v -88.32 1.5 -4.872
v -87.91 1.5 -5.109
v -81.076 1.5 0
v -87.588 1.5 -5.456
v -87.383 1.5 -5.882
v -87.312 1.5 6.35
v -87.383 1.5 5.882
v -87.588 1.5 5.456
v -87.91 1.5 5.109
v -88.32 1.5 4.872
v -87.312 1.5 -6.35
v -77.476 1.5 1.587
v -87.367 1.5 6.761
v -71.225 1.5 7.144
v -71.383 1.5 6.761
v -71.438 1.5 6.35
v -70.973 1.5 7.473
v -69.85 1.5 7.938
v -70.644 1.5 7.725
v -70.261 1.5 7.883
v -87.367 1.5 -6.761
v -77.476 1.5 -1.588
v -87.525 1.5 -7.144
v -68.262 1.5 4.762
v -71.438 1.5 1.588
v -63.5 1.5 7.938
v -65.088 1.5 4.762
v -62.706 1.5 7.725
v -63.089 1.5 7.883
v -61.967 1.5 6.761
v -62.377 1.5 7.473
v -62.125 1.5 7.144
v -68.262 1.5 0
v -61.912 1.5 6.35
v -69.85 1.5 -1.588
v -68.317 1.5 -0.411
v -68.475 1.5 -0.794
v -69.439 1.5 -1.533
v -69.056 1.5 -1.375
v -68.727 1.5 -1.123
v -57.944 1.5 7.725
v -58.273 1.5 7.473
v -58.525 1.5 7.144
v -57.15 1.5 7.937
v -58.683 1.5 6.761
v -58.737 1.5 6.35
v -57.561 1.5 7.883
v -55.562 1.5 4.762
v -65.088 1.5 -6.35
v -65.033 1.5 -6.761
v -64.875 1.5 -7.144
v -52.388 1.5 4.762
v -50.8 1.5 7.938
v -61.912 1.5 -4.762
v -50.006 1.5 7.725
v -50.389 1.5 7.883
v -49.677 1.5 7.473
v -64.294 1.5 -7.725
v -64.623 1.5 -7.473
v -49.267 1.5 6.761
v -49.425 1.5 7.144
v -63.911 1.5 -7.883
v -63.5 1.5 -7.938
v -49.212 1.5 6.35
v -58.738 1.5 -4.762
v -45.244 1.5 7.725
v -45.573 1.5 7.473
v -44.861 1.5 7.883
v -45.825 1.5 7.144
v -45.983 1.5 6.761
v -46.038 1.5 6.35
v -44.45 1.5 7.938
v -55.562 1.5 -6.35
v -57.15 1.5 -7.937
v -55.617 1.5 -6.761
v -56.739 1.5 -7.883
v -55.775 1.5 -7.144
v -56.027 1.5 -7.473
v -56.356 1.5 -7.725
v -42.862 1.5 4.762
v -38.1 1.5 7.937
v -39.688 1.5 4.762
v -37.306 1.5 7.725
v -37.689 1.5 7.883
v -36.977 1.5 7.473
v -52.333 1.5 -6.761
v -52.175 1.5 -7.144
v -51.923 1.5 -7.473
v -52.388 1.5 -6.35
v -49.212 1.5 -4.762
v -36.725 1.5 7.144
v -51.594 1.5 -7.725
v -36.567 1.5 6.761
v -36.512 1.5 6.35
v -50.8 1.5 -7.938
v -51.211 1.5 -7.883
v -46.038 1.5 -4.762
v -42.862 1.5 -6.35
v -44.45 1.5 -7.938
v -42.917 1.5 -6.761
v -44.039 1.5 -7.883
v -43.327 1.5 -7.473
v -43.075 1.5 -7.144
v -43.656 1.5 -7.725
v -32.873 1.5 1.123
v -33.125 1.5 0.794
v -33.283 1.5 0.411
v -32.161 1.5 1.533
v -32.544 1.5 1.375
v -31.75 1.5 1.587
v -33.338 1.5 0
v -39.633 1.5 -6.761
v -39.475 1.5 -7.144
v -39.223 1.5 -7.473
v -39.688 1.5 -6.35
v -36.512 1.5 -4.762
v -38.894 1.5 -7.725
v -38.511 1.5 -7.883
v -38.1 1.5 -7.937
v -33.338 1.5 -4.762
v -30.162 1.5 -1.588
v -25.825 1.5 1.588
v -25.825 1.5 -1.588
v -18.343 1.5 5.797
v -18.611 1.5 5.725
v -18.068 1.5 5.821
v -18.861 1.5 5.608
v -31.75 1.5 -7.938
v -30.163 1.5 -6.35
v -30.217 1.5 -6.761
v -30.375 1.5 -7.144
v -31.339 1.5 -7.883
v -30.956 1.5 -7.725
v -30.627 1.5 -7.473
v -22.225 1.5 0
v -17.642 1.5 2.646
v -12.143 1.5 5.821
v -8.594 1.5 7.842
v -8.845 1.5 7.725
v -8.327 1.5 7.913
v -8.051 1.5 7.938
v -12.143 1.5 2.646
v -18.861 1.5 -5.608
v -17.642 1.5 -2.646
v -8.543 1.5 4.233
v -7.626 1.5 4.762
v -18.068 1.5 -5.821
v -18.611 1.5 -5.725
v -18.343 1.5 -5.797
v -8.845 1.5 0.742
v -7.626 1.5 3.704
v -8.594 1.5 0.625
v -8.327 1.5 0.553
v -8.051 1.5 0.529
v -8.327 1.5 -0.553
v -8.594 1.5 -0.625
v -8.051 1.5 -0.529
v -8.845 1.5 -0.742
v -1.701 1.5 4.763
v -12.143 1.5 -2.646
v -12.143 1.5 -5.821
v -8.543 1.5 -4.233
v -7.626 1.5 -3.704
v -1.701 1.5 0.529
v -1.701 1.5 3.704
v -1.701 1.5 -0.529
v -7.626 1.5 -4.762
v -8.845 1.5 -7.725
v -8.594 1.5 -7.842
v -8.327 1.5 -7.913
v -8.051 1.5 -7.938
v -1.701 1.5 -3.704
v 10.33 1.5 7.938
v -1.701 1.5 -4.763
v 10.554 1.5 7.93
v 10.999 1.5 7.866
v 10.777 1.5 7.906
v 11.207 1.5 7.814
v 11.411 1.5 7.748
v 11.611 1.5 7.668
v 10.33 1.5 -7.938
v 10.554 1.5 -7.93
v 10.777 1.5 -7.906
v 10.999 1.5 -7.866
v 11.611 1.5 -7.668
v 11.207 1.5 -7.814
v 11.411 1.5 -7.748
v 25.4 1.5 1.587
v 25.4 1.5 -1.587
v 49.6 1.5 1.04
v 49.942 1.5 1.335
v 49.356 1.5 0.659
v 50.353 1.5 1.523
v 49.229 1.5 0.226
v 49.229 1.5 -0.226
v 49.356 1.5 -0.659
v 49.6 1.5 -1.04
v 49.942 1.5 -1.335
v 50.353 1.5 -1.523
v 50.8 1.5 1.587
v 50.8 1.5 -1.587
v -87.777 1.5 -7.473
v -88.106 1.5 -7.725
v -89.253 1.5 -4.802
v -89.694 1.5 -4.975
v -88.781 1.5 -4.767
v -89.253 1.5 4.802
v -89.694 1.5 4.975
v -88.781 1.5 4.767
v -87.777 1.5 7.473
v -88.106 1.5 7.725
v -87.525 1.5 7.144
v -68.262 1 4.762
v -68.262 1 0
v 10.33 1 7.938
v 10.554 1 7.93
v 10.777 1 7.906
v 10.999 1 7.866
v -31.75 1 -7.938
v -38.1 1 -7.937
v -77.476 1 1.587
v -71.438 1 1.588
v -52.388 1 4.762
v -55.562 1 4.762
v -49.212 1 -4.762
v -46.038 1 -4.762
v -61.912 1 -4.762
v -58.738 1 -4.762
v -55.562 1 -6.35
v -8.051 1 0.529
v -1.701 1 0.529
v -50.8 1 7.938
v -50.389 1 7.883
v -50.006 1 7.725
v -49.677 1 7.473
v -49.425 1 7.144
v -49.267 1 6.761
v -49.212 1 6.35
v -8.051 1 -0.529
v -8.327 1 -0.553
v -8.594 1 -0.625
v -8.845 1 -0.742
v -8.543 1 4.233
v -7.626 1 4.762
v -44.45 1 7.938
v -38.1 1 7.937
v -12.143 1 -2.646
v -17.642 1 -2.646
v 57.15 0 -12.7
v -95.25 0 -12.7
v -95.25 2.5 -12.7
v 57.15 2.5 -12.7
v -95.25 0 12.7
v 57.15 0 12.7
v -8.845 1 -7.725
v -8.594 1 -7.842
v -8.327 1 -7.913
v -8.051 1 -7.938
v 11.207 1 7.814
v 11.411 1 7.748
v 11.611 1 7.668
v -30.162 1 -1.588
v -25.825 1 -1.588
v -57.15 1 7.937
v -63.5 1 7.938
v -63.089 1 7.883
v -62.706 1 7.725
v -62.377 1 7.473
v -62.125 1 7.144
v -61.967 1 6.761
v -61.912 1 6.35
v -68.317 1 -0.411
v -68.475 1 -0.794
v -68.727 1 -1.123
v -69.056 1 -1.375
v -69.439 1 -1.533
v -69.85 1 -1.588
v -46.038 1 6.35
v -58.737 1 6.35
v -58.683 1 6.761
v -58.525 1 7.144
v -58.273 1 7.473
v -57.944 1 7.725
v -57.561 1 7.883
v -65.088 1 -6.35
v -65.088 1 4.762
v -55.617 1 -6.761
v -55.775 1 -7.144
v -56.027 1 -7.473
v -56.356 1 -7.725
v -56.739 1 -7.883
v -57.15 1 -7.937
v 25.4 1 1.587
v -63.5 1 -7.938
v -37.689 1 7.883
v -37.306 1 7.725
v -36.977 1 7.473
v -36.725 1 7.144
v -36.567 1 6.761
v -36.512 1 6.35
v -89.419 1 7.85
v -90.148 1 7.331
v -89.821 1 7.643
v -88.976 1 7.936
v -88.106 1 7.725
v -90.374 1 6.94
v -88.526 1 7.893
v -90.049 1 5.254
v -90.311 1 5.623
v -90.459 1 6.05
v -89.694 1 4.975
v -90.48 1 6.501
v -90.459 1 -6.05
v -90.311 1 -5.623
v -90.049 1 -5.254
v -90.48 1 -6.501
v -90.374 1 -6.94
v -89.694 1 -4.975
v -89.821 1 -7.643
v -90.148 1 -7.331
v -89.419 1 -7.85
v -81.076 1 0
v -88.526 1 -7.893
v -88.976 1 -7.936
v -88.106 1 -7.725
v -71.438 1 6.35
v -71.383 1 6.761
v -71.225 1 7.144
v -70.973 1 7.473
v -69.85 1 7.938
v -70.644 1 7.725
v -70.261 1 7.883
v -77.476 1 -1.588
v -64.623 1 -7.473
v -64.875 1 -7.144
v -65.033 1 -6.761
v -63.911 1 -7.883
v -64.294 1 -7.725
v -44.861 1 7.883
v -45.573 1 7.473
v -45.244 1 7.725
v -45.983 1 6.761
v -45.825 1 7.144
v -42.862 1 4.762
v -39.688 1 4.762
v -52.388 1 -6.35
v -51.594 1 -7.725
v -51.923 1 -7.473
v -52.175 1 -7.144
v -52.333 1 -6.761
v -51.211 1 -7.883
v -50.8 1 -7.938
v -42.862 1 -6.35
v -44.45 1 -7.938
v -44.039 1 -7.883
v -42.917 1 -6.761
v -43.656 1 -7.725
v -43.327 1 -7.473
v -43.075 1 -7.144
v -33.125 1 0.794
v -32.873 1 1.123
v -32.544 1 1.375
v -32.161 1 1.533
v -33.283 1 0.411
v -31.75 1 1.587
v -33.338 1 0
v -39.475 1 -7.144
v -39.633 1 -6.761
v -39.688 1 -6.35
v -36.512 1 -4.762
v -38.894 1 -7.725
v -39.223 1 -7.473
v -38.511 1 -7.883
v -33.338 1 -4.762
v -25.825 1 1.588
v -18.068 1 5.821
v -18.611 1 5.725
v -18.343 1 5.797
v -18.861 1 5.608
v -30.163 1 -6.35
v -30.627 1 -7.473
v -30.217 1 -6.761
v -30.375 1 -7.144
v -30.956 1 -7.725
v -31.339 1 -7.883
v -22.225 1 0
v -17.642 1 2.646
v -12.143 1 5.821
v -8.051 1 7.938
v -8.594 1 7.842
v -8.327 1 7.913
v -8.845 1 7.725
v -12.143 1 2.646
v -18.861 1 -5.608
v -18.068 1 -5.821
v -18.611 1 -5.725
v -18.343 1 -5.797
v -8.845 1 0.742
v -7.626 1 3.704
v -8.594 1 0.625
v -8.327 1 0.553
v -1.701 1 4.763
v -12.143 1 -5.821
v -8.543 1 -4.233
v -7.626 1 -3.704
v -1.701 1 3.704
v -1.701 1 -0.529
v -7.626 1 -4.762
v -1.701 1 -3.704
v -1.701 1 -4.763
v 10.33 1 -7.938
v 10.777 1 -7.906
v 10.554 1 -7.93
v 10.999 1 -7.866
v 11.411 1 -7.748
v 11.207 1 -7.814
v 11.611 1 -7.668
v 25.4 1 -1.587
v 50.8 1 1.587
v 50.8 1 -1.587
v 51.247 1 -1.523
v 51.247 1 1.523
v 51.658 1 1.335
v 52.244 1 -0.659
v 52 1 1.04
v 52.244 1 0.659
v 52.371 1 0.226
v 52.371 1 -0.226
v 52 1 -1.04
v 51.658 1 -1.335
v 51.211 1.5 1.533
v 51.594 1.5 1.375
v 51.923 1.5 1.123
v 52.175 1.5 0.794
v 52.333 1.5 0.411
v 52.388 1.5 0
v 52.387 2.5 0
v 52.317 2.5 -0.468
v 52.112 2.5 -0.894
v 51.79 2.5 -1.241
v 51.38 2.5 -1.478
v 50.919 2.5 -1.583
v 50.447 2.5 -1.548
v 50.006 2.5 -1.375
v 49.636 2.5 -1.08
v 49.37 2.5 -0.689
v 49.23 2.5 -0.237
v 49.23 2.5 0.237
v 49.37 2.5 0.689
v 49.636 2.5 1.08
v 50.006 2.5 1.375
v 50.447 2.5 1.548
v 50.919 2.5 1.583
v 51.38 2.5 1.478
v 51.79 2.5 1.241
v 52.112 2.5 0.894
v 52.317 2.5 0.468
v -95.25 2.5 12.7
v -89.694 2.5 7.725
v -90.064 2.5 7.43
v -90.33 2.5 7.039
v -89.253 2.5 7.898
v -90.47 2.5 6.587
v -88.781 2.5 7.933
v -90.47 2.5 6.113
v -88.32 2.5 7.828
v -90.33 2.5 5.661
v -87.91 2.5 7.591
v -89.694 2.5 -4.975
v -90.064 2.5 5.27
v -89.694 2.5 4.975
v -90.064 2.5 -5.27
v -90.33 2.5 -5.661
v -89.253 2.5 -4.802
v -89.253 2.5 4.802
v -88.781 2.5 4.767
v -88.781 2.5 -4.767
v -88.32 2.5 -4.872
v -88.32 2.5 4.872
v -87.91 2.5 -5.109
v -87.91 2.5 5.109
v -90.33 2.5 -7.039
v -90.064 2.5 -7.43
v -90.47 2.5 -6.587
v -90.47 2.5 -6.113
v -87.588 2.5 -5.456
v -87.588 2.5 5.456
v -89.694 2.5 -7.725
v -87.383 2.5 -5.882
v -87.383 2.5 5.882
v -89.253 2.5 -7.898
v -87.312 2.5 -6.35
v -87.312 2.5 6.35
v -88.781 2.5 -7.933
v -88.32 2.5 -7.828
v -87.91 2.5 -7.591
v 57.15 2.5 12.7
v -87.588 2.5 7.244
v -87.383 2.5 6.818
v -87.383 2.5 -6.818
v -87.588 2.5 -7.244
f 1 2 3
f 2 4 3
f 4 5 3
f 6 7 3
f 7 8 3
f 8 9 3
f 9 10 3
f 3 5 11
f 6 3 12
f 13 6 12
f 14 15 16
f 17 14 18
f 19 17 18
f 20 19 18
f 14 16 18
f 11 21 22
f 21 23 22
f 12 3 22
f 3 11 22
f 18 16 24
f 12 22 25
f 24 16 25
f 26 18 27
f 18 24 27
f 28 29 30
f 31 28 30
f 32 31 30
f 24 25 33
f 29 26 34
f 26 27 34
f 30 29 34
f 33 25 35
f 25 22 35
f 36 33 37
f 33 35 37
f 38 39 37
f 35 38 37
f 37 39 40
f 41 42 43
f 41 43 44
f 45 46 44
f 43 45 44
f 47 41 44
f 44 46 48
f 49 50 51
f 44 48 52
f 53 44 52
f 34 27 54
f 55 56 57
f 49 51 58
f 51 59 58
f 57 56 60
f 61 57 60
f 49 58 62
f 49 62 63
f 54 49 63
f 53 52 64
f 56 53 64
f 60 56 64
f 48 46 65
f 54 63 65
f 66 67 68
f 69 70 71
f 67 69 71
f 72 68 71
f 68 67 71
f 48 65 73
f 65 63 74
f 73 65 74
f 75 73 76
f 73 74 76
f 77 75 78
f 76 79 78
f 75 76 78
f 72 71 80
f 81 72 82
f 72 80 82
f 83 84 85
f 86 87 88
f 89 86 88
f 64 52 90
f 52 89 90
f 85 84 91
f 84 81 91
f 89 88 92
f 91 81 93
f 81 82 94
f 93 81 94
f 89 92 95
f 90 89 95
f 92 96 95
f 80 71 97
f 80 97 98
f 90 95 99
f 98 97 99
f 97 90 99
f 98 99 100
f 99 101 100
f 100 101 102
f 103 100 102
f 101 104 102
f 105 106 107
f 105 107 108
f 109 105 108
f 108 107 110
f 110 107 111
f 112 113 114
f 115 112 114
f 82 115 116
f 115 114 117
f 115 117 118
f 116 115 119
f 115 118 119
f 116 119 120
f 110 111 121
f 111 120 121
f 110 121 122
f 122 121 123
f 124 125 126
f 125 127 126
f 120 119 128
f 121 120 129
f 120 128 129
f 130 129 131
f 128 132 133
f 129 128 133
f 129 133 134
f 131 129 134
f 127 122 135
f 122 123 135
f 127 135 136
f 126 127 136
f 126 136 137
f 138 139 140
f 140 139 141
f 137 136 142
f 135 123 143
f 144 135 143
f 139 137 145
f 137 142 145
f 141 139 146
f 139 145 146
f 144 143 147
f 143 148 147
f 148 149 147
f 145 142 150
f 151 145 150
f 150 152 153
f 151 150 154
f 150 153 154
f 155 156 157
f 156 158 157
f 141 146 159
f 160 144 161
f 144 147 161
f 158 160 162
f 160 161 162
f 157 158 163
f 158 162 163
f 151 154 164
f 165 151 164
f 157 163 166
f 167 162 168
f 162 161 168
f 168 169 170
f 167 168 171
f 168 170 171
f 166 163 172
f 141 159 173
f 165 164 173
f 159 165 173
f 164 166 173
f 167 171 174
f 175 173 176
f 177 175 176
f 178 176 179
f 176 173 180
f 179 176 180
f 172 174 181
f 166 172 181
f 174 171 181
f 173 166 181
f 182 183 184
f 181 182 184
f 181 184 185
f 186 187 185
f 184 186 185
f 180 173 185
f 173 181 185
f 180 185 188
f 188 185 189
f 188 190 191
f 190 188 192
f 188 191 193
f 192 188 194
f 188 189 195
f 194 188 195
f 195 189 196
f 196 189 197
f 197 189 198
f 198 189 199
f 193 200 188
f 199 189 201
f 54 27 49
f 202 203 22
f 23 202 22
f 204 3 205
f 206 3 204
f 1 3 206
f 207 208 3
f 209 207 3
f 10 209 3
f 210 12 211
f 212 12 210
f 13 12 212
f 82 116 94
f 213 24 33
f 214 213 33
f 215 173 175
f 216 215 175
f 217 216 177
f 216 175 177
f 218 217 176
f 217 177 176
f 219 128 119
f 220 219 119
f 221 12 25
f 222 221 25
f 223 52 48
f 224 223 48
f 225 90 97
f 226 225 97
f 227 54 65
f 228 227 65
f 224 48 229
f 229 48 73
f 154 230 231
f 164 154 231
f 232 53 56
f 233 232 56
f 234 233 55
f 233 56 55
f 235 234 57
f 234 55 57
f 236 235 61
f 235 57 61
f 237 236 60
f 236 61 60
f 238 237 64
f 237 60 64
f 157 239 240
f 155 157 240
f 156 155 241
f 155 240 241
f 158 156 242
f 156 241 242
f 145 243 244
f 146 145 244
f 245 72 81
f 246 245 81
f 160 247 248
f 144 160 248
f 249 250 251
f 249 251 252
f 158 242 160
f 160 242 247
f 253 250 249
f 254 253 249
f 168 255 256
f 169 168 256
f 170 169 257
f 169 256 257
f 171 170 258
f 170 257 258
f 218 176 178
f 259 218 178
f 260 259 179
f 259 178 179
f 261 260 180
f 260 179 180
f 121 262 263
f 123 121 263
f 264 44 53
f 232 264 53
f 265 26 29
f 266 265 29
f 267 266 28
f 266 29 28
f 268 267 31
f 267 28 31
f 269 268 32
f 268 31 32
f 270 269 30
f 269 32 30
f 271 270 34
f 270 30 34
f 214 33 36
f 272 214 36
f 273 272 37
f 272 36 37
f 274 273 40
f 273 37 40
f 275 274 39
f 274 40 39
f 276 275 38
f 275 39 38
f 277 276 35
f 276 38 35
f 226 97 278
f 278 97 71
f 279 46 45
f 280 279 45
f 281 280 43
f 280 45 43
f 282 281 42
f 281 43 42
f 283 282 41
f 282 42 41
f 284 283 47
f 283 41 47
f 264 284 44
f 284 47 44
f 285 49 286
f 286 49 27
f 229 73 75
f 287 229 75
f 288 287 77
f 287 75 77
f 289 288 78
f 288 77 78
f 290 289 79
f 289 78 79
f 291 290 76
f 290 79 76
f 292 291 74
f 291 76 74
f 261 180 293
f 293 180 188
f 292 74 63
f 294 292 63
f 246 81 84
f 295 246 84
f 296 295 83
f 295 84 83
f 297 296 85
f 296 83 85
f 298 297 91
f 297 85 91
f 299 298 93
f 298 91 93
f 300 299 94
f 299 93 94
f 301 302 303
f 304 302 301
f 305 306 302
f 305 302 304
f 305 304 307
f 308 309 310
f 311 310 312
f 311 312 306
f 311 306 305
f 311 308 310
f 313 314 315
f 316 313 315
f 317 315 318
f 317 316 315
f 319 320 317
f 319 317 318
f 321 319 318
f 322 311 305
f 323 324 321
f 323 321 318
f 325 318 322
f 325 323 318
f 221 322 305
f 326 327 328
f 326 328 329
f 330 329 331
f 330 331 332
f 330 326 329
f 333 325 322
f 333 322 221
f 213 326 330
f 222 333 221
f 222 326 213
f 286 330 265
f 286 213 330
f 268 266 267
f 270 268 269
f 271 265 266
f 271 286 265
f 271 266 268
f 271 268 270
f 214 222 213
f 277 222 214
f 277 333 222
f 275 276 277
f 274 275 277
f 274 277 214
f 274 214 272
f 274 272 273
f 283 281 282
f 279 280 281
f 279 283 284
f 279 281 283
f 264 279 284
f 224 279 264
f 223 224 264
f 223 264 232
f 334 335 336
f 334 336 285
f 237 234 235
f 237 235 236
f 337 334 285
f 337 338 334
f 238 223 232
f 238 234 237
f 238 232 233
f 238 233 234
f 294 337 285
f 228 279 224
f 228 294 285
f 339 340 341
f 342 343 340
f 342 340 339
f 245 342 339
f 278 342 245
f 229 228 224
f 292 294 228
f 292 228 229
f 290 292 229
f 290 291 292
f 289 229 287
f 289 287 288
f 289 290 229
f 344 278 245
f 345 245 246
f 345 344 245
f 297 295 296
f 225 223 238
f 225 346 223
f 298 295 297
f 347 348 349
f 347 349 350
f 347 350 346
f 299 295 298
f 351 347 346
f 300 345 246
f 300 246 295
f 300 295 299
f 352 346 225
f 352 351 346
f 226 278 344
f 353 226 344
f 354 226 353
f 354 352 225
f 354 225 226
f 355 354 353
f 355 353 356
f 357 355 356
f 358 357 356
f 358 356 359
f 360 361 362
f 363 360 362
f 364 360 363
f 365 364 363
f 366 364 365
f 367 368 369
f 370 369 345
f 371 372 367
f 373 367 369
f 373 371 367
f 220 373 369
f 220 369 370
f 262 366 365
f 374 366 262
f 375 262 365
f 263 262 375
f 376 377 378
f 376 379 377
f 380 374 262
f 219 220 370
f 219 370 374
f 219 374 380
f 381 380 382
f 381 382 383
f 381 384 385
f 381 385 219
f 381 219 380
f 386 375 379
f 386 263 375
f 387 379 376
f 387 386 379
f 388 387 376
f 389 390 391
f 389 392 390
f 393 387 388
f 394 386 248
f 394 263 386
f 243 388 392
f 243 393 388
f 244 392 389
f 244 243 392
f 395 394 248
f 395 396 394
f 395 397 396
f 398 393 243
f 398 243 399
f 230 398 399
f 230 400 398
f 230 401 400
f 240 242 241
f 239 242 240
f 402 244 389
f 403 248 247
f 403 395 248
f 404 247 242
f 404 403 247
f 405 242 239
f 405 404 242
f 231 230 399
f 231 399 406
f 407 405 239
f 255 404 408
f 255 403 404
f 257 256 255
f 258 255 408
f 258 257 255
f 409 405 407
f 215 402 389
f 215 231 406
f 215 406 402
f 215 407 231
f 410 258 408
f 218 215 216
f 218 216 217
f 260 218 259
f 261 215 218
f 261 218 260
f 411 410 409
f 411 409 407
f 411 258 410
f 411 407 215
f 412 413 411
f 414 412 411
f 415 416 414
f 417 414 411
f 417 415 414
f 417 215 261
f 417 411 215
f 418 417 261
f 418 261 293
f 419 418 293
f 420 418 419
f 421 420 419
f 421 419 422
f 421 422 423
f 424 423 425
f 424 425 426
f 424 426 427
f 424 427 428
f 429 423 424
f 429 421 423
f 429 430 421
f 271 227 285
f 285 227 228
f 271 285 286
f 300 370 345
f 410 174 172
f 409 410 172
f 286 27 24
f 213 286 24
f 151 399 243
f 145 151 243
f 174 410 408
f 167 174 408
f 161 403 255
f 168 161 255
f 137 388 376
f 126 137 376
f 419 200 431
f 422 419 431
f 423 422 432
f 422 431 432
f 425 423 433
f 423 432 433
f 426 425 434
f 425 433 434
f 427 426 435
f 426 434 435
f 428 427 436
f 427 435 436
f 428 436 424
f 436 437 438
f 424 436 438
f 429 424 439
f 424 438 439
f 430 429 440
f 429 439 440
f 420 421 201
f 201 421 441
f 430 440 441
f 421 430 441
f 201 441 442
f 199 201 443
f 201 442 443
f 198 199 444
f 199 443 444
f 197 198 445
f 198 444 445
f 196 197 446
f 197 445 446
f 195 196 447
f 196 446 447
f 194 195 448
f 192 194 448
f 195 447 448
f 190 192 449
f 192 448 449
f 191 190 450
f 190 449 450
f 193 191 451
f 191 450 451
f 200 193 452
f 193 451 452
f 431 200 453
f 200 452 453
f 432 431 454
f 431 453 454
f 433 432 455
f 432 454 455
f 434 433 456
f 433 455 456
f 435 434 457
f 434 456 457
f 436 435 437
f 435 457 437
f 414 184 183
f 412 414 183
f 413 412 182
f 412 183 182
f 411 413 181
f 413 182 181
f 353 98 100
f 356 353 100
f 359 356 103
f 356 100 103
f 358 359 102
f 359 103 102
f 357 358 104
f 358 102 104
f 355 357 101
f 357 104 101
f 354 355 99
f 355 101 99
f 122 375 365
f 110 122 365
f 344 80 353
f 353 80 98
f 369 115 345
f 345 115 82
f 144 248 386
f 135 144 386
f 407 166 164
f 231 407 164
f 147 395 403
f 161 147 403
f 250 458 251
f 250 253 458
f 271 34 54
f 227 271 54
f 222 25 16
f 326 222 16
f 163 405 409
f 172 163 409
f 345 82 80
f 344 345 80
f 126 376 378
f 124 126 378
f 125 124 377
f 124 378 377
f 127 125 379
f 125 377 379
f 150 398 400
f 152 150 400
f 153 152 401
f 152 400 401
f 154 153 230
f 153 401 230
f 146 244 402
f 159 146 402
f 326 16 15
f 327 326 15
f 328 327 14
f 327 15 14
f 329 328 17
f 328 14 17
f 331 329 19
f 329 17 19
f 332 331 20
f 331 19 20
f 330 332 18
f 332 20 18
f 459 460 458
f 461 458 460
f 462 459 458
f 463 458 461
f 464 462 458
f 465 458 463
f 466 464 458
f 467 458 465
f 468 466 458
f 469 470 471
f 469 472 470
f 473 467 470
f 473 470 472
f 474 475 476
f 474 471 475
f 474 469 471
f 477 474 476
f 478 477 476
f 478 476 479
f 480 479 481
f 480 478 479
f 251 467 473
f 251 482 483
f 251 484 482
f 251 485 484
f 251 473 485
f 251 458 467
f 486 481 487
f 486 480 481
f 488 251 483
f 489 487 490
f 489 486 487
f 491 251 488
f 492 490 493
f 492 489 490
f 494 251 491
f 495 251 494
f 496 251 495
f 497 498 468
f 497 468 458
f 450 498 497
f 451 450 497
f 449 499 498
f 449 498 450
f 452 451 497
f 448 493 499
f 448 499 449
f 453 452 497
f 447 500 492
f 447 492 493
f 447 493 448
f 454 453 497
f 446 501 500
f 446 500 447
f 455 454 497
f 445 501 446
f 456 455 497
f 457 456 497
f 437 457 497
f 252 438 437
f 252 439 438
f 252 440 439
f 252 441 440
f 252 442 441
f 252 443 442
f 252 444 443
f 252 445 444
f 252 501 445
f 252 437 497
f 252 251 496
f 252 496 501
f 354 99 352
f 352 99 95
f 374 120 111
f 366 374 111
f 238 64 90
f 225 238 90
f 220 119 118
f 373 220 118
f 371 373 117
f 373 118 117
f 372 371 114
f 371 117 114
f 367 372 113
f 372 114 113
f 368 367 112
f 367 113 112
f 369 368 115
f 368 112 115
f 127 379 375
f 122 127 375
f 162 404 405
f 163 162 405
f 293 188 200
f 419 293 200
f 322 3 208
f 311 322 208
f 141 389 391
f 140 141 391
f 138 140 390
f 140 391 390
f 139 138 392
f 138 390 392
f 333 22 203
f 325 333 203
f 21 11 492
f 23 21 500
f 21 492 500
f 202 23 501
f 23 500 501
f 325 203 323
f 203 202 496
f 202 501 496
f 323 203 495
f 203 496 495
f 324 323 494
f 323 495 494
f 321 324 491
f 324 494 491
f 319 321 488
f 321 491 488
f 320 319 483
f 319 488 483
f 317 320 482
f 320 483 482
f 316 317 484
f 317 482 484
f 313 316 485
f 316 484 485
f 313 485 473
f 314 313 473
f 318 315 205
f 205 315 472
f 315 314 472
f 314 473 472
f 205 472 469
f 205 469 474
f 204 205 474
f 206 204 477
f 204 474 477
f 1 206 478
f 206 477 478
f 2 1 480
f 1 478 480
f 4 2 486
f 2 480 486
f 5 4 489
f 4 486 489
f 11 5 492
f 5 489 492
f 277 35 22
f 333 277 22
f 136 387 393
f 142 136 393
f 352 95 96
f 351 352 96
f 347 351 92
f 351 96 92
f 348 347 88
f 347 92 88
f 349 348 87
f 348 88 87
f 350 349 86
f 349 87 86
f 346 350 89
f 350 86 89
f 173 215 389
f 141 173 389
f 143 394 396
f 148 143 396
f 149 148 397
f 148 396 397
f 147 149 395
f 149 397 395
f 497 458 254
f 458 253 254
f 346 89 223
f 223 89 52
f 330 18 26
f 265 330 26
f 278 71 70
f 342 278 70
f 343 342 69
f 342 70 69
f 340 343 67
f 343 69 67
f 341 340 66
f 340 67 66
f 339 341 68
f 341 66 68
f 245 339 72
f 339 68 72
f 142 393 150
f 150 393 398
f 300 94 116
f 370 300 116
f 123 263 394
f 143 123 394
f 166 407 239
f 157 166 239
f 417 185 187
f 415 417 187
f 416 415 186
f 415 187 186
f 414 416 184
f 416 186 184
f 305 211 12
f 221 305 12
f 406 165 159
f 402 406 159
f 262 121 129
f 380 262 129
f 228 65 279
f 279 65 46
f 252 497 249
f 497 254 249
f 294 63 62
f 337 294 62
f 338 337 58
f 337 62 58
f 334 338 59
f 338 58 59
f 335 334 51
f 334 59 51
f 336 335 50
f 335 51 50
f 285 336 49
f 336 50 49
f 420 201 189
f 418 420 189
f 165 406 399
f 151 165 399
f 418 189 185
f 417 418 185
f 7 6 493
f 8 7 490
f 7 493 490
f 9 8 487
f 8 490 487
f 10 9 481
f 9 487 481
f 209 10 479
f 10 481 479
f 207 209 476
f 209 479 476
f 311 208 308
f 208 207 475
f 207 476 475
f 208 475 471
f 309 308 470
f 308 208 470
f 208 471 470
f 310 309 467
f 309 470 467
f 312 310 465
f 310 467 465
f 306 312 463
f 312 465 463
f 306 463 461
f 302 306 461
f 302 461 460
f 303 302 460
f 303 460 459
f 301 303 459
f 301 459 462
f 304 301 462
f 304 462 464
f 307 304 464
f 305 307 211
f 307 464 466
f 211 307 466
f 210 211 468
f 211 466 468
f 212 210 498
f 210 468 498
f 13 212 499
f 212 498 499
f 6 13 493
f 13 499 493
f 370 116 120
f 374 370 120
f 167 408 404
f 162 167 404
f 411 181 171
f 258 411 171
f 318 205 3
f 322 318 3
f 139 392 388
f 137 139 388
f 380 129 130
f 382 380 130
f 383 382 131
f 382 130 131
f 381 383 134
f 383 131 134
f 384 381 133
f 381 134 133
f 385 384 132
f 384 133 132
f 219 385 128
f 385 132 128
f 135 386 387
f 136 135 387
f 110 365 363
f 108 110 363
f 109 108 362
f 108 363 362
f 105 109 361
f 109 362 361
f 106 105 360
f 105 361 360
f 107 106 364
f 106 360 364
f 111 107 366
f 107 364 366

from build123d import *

# Parameters (mm, degrees)
BOSS_EXTRUDE1_DEPTH = 1
SKETCH5_W           = 152.4
SKETCH5_H           = 25.4
BOSS_EXTRUDE3_DEPTH = 0.5
CUT_EXTRUDE1_DEPTH  = 0.5
SKETCH7_W           = 1.5875
SKETCH7_H           = 1.5875
SKETCH7_W_2         = 3.175
CUT_EXTRUDE2_DEPTH  = 0.5
SKETCH8_W           = 152.4
SKETCH8_H           = 25.4
BOSS_EXTRUDE4_DEPTH = 1
CUT_EXTRUDE8_REACH  = 4.5
SKETCH9_R           = 1.5875


with BuildPart() as part:
    # Sketch1 → Boss-Extrude1 (new body)
    with BuildSketch(Plane(origin=(0, 0, 0), x_dir=(1, 0, 0), z_dir=(0, 1, 0))):
        Polygon((-44.45, -12.7), (31.75, -12.7), (57.15, -12.7), (57.15, 12.7), (31.75, 12.7), (-44.45, 12.7), (-69.85, 12.7), (-95.25, 12.7), (-95.25, -12.7), (-69.85, -12.7), align=None)
    extrude(amount=BOSS_EXTRUDE1_DEPTH)

    # Sketch5 → Boss-Extrude3 (add)
    with BuildSketch(Plane(origin=(0, 1, 0), x_dir=(1, 0, 0), z_dir=(0, 1, 0))):
        with Locations((-19.05, 0)):
            Rectangle(SKETCH5_W, SKETCH5_H)
        with BuildLine():
            ThreePointArc((-31.75, -1.5875), (-33.3375, 0), (-31.75, 1.5875))
            Line((-31.75, 1.5875), (-25.825369343, 1.5875))
            Line((-25.825369343, 1.5875), (-18.861401581, 5.608148662))
            ThreePointArc((-18.861401581, 5.608148662), (-18.478526815, 5.766740583), (-18.067651581, 5.820833333))
            Line((-18.067651581, 5.820833333), (-12.143020924, 5.820833333))
            Line((-12.143020924, 5.820833333), (-8.845227372, 7.724815329))
            ThreePointArc((-8.845227372, 7.724815329), (-8.462352606, 7.883407249), (-8.051477372, 7.9375))
            Line((-8.051477372, 7.9375), (-1.701477372, 7.9375))
            ThreePointArc((-1.701477372, 7.9375), (-0.113977372, 6.35), (-1.701477372, 4.7625))
            Line((-1.701477372, 4.7625), (-7.626108029, 4.7625))
            Line((-7.626108029, 4.7625), (-8.542651581, 4.233333333))
            Line((-8.542651581, 4.233333333), (-7.626108029, 3.704166667))
            Line((-7.626108029, 3.704166667), (-1.701477372, 3.704166667))
            ThreePointArc((-1.701477372, 3.704166667), (-0.113977372, 2.116666667), (-1.701477372, 0.529166667))
            Line((-1.701477372, 0.529166667), (-8.051477372, 0.529166667))
            ThreePointArc((-8.051477372, 0.529166667), (-8.462352606, 0.583259417), (-8.845227372, 0.741851338))
            Line((-8.845227372, 0.741851338), (-12.143020924, 2.645833333))
            Line((-12.143020924, 2.645833333), (-17.642282238, 2.645833333))
            Line((-17.642282238, 2.645833333), (-22.225, 0))
            Line((-22.225, 0), (-17.642282238, -2.645833333))
            Line((-17.642282238, -2.645833333), (-12.143020924, -2.645833333))
            Line((-12.143020924, -2.645833333), (-8.845227372, -0.741851338))
            ThreePointArc((-8.845227372, -0.741851338), (-8.462352606, -0.583259417), (-8.051477372, -0.529166667))
            Line((-8.051477372, -0.529166667), (-1.701477372, -0.529166667))
            ThreePointArc((-1.701477372, -0.529166667), (-0.113977372, -2.116666667), (-1.701477372, -3.704166667))
            Line((-1.701477372, -3.704166667), (-7.626108029, -3.704166667))
            Line((-7.626108029, -3.704166667), (-8.542651581, -4.233333333))
            Line((-8.542651581, -4.233333333), (-7.626108029, -4.7625))
            Line((-7.626108029, -4.7625), (-1.701477372, -4.7625))
            ThreePointArc((-1.701477372, -4.7625), (-0.113977372, -6.35), (-1.701477372, -7.9375))
            Line((-1.701477372, -7.9375), (-8.051477372, -7.9375))
            ThreePointArc((-8.051477372, -7.9375), (-8.462352606, -7.883407249), (-8.845227372, -7.724815329))
            Line((-8.845227372, -7.724815329), (-12.143020924, -5.820833333))
            Line((-12.143020924, -5.820833333), (-18.067651581, -5.820833333))
            ThreePointArc((-18.067651581, -5.820833333), (-18.478526815, -5.766740583), (-18.861401581, -5.608148662))
            Line((-18.861401581, -5.608148662), (-25.825369343, -1.5875))
            Line((-25.825369343, -1.5875), (-31.75, -1.5875))
        make_face(mode=Mode.SUBTRACT)
    extrude(amount=BOSS_EXTRUDE3_DEPTH)

    # Sketch6 → Cut-Extrude1 (cut)
    with BuildSketch(Plane(origin=(0, 1.5, 0), x_dir=(1, 0, 0), z_dir=(0, 1, 0))):
        with BuildLine():
            Line((-1.701477372, -7.9375), (10.329619478, -7.9375))
            ThreePointArc((10.329619478, -7.9375), (10.665963649, -7.919634397), (10.998522628, -7.866238645))
            Line((10.998522628, -7.866238645), (10.998522628, 7.866238645))
            ThreePointArc((10.998522628, 7.866238645), (10.665963649, 7.919634397), (10.329619478, 7.9375))
            Line((10.329619478, 7.9375), (-1.701477372, 7.9375))
            ThreePointArc((-1.701477372, 7.9375), (-0.113977372, 6.35), (-1.701477372, 4.7625))
            Line((-1.701477372, 4.7625), (-1.701477372, 3.704166667))
            ThreePointArc((-1.701477372, 3.704166667), (-0.113977372, 2.116666667), (-1.701477372, 0.529166667))
            Line((-1.701477372, 0.529166667), (-1.701477372, -0.529166667))
            ThreePointArc((-1.701477372, -0.529166667), (-0.113977372, -2.116666667), (-1.701477372, -3.704166667))
            Line((-1.701477372, -3.704166667), (-1.701477372, -4.7625))
            ThreePointArc((-1.701477372, -4.7625), (-0.113977372, -6.35), (-1.701477372, -7.9375))
        make_face()
        with BuildLine():
            Line((10.998522628, 7.866238645), (10.998522628, -7.866238645))
            ThreePointArc((10.998522628, -7.866238645), (11.309590864, -7.782480312), (11.610570405, -7.667631619))
            Line((11.610570405, -7.667631619), (25.4, -1.5875))
            ThreePointArc((25.4, -1.5875), (23.8125, 0), (25.4, 1.5875))
            Line((25.4, 1.5875), (11.610570405, 7.667631619))
            ThreePointArc((11.610570405, 7.667631619), (11.309590864, 7.782480312), (10.998522628, 7.866238645))
        make_face()
        with BuildLine():
            ThreePointArc((25.4, 1.5875), (23.8125, 0), (25.4, -1.5875))
            Line((25.4, -1.5875), (25.4, 1.5875))
        make_face()
        with BuildLine():
            Line((25.4, 1.5875), (25.4, -1.5875))
            ThreePointArc((25.4, -1.5875), (26.522532015, -1.122532015), (26.9875, 0))
            ThreePointArc((26.9875, 0), (26.522532015, 1.122532015), (25.4, 1.5875))
        make_face()
        with BuildLine():
            ThreePointArc((26.9875, 0), (26.522532015, -1.122532015), (25.4, -1.5875))
            Line((25.4, -1.5875), (50.8, -1.5875))
            ThreePointArc((50.8, -1.5875), (52.3875, 0), (50.8, 1.5875))
            Line((50.8, 1.5875), (25.4, 1.5875))
            ThreePointArc((25.4, 1.5875), (26.522532015, 1.122532015), (26.9875, 0))
        make_face()
    extrude(amount=-CUT_EXTRUDE1_DEPTH, mode=Mode.SUBTRACT)

    # Sketch7 → Cut-Extrude2 (cut)
    with BuildSketch(Plane(origin=(0, 1.5, 0), x_dir=(1, 0, 0), z_dir=(0, 1, 0))):
        with Locations((-32.54375, 5.55625)):
            Rectangle(SKETCH7_W, SKETCH7_H)
        with BuildLine():
            ThreePointArc((-30.1625, 6.35), (-30.627467985, 5.227467985), (-31.75, 4.7625))
            Line((-31.75, 4.7625), (-33.3375, 4.7625))
            Line((-33.3375, 4.7625), (-33.3375, 0))
            ThreePointArc((-33.3375, 0), (-31.75, -1.5875), (-30.1625, 0))
            Line((-30.1625, 0), (-30.1625, 6.35))
        make_face()
        with BuildLine():
            Line((-31.75, 6.35), (-31.75, 4.7625))
            ThreePointArc((-31.75, 4.7625), (-30.627467985, 5.227467985), (-30.1625, 6.35))
            ThreePointArc((-30.1625, 6.35), (-30.627467985, 7.472532015), (-31.75, 7.9375))
            ThreePointArc((-31.75, 7.9375), (-32.872532015, 7.472532015), (-33.3375, 6.35))
            Line((-33.3375, 6.35), (-31.75, 6.35))
        make_face()
        with Locations((-34.925, 5.55625)):
            Rectangle(SKETCH7_W_2, SKETCH7_H)
        with BuildLine():
            Line((-36.5125, 6.35), (-33.3375, 6.35))
            ThreePointArc((-33.3375, 6.35), (-32.872532015, 7.472532015), (-31.75, 7.9375))
            Line((-31.75, 7.9375), (-38.1, 7.9375))
            ThreePointArc((-38.1, 7.9375), (-36.977467985, 7.472532015), (-36.5125, 6.35))
        make_face()
        with Locations((-37.30625, 5.55625)):
            Rectangle(SKETCH7_W, SKETCH7_H)
        with BuildLine():
            Line((-36.5125, -6.35), (-36.5125, 4.7625))
            Line((-36.5125, 4.7625), (-38.1, 4.7625))
            Line((-38.1, 4.7625), (-38.1, -4.7625))
            ThreePointArc((-38.1, -4.7625), (-36.977467985, -5.227467985), (-36.5125, -6.35))
        make_face()
        with BuildLine():
            Line((-38.1, 6.35), (-36.5125, 6.35))
            ThreePointArc((-36.5125, 6.35), (-36.977467985, 7.472532015), (-38.1, 7.9375))
            ThreePointArc((-38.1, 7.9375), (-39.222532015, 7.472532015), (-39.6875, 6.35))
            ThreePointArc((-39.6875, 6.35), (-39.222532015, 5.227467985), (-38.1, 4.7625))
            Line((-38.1, 4.7625), (-38.1, 6.35))
        make_face()
        with BuildLine():
            ThreePointArc((-38.1, -7.9375), (-36.977467985, -7.472532015), (-36.5125, -6.35))
            ThreePointArc((-36.5125, -6.35), (-36.977467985, -5.227467985), (-38.1, -4.7625))
            Line((-38.1, -4.7625), (-38.1, -6.35))
            Line((-38.1, -6.35), (-39.6875, -6.35))
            ThreePointArc((-39.6875, -6.35), (-39.222532015, -7.472532015), (-38.1, -7.9375))
        make_face()
        with BuildLine():
            Line((-38.1, -4.7625), (-38.1, 4.7625))
            ThreePointArc((-38.1, 4.7625), (-39.222532015, 5.227467985), (-39.6875, 6.35))
            Line((-39.6875, 6.35), (-39.6875, -4.7625))
            Line((-39.6875, -4.7625), (-38.1, -4.7625))
        make_face()
        with BuildLine():
            Line((-44.45, -7.9375), (-38.1, -7.9375))
            ThreePointArc((-38.1, -7.9375), (-39.222532015, -7.472532015), (-39.6875, -6.35))
            Line((-39.6875, -6.35), (-42.8625, -6.35))
            ThreePointArc((-42.8625, -6.35), (-43.327467985, -7.472532015), (-44.45, -7.9375))
        make_face()
        with Locations((-38.89375, -5.55625)):
            Rectangle(SKETCH7_W, SKETCH7_H)
        with BuildLine():
            ThreePointArc((-46.0375, -6.35), (-45.572532015, -7.472532015), (-44.45, -7.9375))
            ThreePointArc((-44.45, -7.9375), (-43.327467985, -7.472532015), (-42.8625, -6.35))
            Line((-42.8625, -6.35), (-44.45, -6.35))
            Line((-44.45, -6.35), (-44.45, -4.7625))
            ThreePointArc((-44.45, -4.7625), (-45.572532015, -5.227467985), (-46.0375, -6.35))
        make_face()
        with Locations((-41.275, -5.55625)):
            Rectangle(SKETCH7_W_2, SKETCH7_H)
        with BuildLine():
            Line((-46.0375, 0), (-46.0375, -6.35))
            ThreePointArc((-46.0375, -6.35), (-45.572532015, -5.227467985), (-44.45, -4.7625))
            Line((-44.45, -4.7625), (-44.45, -1.5875))
            ThreePointArc((-44.45, -1.5875), (-45.572532015, -1.122532015), (-46.0375, 0))
        make_face()
        with Locations((-43.65625, -5.55625)):
            Rectangle(SKETCH7_W, SKETCH7_H)
        with BuildLine():
            Line((-44.45, -4.7625), (-42.8625, -4.7625))
            Line((-42.8625, -4.7625), (-42.8625, 0))
            ThreePointArc((-42.8625, 0), (-43.327467985, -1.122532015), (-44.45, -1.5875))
            Line((-44.45, -1.5875), (-44.45, -4.7625))
        make_face()
        with BuildLine():
            Line((-46.0375, 4.7625), (-46.0375, 0))
            ThreePointArc((-46.0375, 0), (-44.45, 1.5875), (-42.8625, 0))
            Line((-42.8625, 0), (-42.8625, 6.35))
            ThreePointArc((-42.8625, 6.35), (-43.327467985, 5.227467985), (-44.45, 4.7625))
            Line((-44.45, 4.7625), (-46.0375, 4.7625))
        make_face()
        with BuildLine():
            ThreePointArc((-42.8625, 0), (-44.45, 1.5875), (-46.0375, 0))
            ThreePointArc((-46.0375, 0), (-45.572532015, -1.122532015), (-44.45, -1.5875))
            ThreePointArc((-44.45, -1.5875), (-43.327467985, -1.122532015), (-42.8625, 0))
        make_face()
        with BuildLine():
            Line((-46.0375, 6.35), (-46.0375, 4.7625))
            Line((-46.0375, 4.7625), (-44.45, 4.7625))
            ThreePointArc((-44.45, 4.7625), (-43.327467985, 5.227467985), (-42.8625, 6.35))
            ThreePointArc((-42.8625, 6.35), (-43.327467985, 7.472532015), (-44.45, 7.9375))
            ThreePointArc((-44.45, 7.9375), (-45.572532015, 7.472532015), (-46.0375, 6.35))
        make_face()
        with BuildLine():
            Line((-49.2125, 4.7625), (-46.0375, 4.7625))
            Line((-46.0375, 4.7625), (-46.0375, 6.35))
            ThreePointArc((-46.0375, 6.35), (-45.572532015, 7.472532015), (-44.45, 7.9375))
            Line((-44.45, 7.9375), (-50.8, 7.9375))
            ThreePointArc((-50.8, 7.9375), (-49.677467985, 7.472532015), (-49.2125, 6.35))
            Line((-49.2125, 6.35), (-49.2125, 4.7625))
        make_face()
        with BuildLine():
            Line((-50.8, 4.7625), (-49.2125, 4.7625))
            Line((-49.2125, 4.7625), (-49.2125, 6.35))
            ThreePointArc((-49.2125, 6.35), (-49.677467985, 7.472532015), (-50.8, 7.9375))
            ThreePointArc((-50.8, 7.9375), (-51.922532015, 7.472532015), (-52.3875, 6.35))
            ThreePointArc((-52.3875, 6.35), (-51.922532015, 5.227467985), (-50.8, 4.7625))
        make_face()
        with BuildLine():
            Line((-49.2125, -6.35), (-49.2125, 4.7625))
            Line((-49.2125, 4.7625), (-50.8, 4.7625))
            ThreePointArc((-50.8, 4.7625), (-51.922532015, 5.227467985), (-52.3875, 6.35))
            Line((-52.3875, 6.35), (-52.3875, -4.7625))
            Line((-52.3875, -4.7625), (-50.8, -4.7625))
            ThreePointArc((-50.8, -4.7625), (-49.677467985, -5.227467985), (-49.2125, -6.35))
        make_face()
        with BuildLine():
            ThreePointArc((-50.8, -7.9375), (-49.677467985, -7.472532015), (-49.2125, -6.35))
            ThreePointArc((-49.2125, -6.35), (-49.677467985, -5.227467985), (-50.8, -4.7625))
            Line((-50.8, -4.7625), (-52.3875, -4.7625))
            Line((-52.3875, -4.7625), (-52.3875, -6.35))
            ThreePointArc((-52.3875, -6.35), (-51.922532015, -7.472532015), (-50.8, -7.9375))
        make_face()
        with BuildLine():
            Line((-57.15, -7.9375), (-50.8, -7.9375))
            ThreePointArc((-50.8, -7.9375), (-51.922532015, -7.472532015), (-52.3875, -6.35))
            Line((-52.3875, -6.35), (-52.3875, -4.7625))
            Line((-52.3875, -4.7625), (-55.5625, -4.7625))
            Line((-55.5625, -4.7625), (-55.5625, -6.35))
            ThreePointArc((-55.5625, -6.35), (-56.027467985, -7.472532015), (-57.15, -7.9375))
        make_face()
        with BuildLine():
            ThreePointArc((-58.7375, -6.35), (-58.272532015, -7.472532015), (-57.15, -7.9375))
            ThreePointArc((-57.15, -7.9375), (-56.027467985, -7.472532015), (-55.5625, -6.35))
            Line((-55.5625, -6.35), (-55.5625, -4.7625))
            Line((-55.5625, -4.7625), (-57.15, -4.7625))
            ThreePointArc((-57.15, -4.7625), (-58.272532015, -5.227467985), (-58.7375, -6.35))
        make_face()
        with BuildLine():
            Line((-58.7375, 0), (-58.7375, -6.35))
            ThreePointArc((-58.7375, -6.35), (-58.272532015, -5.227467985), (-57.15, -4.7625))
            Line((-57.15, -4.7625), (-55.5625, -4.7625))
            Line((-55.5625, -4.7625), (-55.5625, 0))
            ThreePointArc((-55.5625, 0), (-57.15, -1.5875), (-58.7375, 0))
        make_face()
        with BuildLine():
            Line((-58.7375, 4.7625), (-58.7375, 0))
            ThreePointArc((-58.7375, 0), (-57.15, 1.5875), (-55.5625, 0))
            Line((-55.5625, 0), (-55.5625, 6.35))
            ThreePointArc((-55.5625, 6.35), (-56.027467985, 5.227467985), (-57.15, 4.7625))
            Line((-57.15, 4.7625), (-58.7375, 4.7625))
        make_face()
        with BuildLine():
            ThreePointArc((-55.5625, 0), (-57.15, 1.5875), (-58.7375, 0))
            ThreePointArc((-58.7375, 0), (-57.15, -1.5875), (-55.5625, 0))
        make_face()
        with BuildLine():
            Line((-58.7375, 6.35), (-58.7375, 4.7625))
            Line((-58.7375, 4.7625), (-57.15, 4.7625))
            ThreePointArc((-57.15, 4.7625), (-56.027467985, 5.227467985), (-55.5625, 6.35))
            ThreePointArc((-55.5625, 6.35), (-56.027467985, 7.472532015), (-57.15, 7.9375))
            ThreePointArc((-57.15, 7.9375), (-58.272532015, 7.472532015), (-58.7375, 6.35))
        make_face()
        with BuildLine():
            Line((-61.9125, 4.7625), (-58.7375, 4.7625))
            Line((-58.7375, 4.7625), (-58.7375, 6.35))
            ThreePointArc((-58.7375, 6.35), (-58.272532015, 7.472532015), (-57.15, 7.9375))
            Line((-57.15, 7.9375), (-63.5, 7.9375))
            ThreePointArc((-63.5, 7.9375), (-62.377467985, 7.472532015), (-61.9125, 6.35))
            Line((-61.9125, 6.35), (-61.9125, 4.7625))
        make_face()
        with BuildLine():
            Line((-63.5, 4.7625), (-61.9125, 4.7625))
            Line((-61.9125, 4.7625), (-61.9125, 6.35))
            ThreePointArc((-61.9125, 6.35), (-62.377467985, 7.472532015), (-63.5, 7.9375))
            ThreePointArc((-63.5, 7.9375), (-64.622532015, 7.472532015), (-65.0875, 6.35))
            ThreePointArc((-65.0875, 6.35), (-64.622532015, 5.227467985), (-63.5, 4.7625))
        make_face()
        with BuildLine():
            Line((-61.9125, -6.35), (-61.9125, 4.7625))
            Line((-61.9125, 4.7625), (-63.5, 4.7625))
            ThreePointArc((-63.5, 4.7625), (-64.622532015, 5.227467985), (-65.0875, 6.35))
            Line((-65.0875, 6.35), (-65.0875, -4.7625))
            Line((-65.0875, -4.7625), (-63.5, -4.7625))
            ThreePointArc((-63.5, -4.7625), (-62.377467985, -5.227467985), (-61.9125, -6.35))
        make_face()
        with BuildLine():
            ThreePointArc((-63.5, -7.9375), (-62.377467985, -7.472532015), (-61.9125, -6.35))
            ThreePointArc((-61.9125, -6.35), (-62.377467985, -5.227467985), (-63.5, -4.7625))
            Line((-63.5, -4.7625), (-65.0875, -4.7625))
            Line((-65.0875, -4.7625), (-65.0875, -6.35))
            ThreePointArc((-65.0875, -6.35), (-64.622532015, -7.472532015), (-63.5, -7.9375))
        make_face()
        with BuildLine():
            Line((-69.85, -7.9375), (-63.5, -7.9375))
            ThreePointArc((-63.5, -7.9375), (-64.622532015, -7.472532015), (-65.0875, -6.35))
            Line((-65.0875, -6.35), (-65.0875, -4.7625))
            Line((-65.0875, -4.7625), (-68.2625, -4.7625))
            Line((-68.2625, -4.7625), (-68.2625, -6.35))
            ThreePointArc((-68.2625, -6.35), (-68.727467985, -7.472532015), (-69.85, -7.9375))
        make_face()
        with BuildLine():
            ThreePointArc((-71.4375, -6.35), (-70.972532015, -7.472532015), (-69.85, -7.9375))
            ThreePointArc((-69.85, -7.9375), (-68.727467985, -7.472532015), (-68.2625, -6.35))
            Line((-68.2625, -6.35), (-68.2625, -4.7625))
            Line((-68.2625, -4.7625), (-69.85, -4.7625))
            ThreePointArc((-69.85, -4.7625), (-70.972532015, -5.227467985), (-71.4375, -6.35))
        make_face()
        with BuildLine():
            Line((-71.4375, -1.5875), (-71.4375, -6.35))
            ThreePointArc((-71.4375, -6.35), (-70.972532015, -5.227467985), (-69.85, -4.7625))
            Line((-69.85, -4.7625), (-68.2625, -4.7625))
            Line((-68.2625, -4.7625), (-68.2625, 0))
            ThreePointArc((-68.2625, 0), (-68.727467985, -1.122532015), (-69.85, -1.5875))
            Line((-69.85, -1.5875), (-71.4375, -1.5875))
        make_face()
        with BuildLine():
            Line((-77.476108029, -1.5875), (-71.4375, -1.5875))
            Line((-71.4375, -1.5875), (-71.4375, 0))
            ThreePointArc((-71.4375, 0), (-70.972532015, 1.122532015), (-69.85, 1.5875))
            Line((-69.85, 1.5875), (-77.476108029, 1.5875))
            Line((-77.476108029, 1.5875), (-77.107727372, 1.374815329))
            ThreePointArc((-77.107727372, 1.374815329), (-76.313977372, 0), (-77.107727372, -1.374815329))
            Line((-77.107727372, -1.374815329), (-77.476108029, -1.5875))
        make_face()
        with BuildLine():
            Line((-71.4375, 0), (-71.4375, -1.5875))
            Line((-71.4375, -1.5875), (-69.85, -1.5875))
            ThreePointArc((-69.85, -1.5875), (-68.727467985, -1.122532015), (-68.2625, 0))
            ThreePointArc((-68.2625, 0), (-68.727467985, 1.122532015), (-69.85, 1.5875))
            ThreePointArc((-69.85, 1.5875), (-70.972532015, 1.122532015), (-71.4375, 0))
        make_face()
        with BuildLine():
            Line((-88.10625, -7.724815329), (-77.476108029, -1.5875))
            Line((-77.476108029, -1.5875), (-77.901477372, -1.5875))
            ThreePointArc((-77.901477372, -1.5875), (-78.312352606, -1.533407249), (-78.695227372, -1.374815329))
            Line((-78.695227372, -1.374815329), (-81.076477372, 0))
            Line((-81.076477372, 0), (-89.69375, -4.975184671))
            ThreePointArc((-89.69375, -4.975184671), (-90.274815329, -7.14375), (-88.10625, -7.724815329))
        make_face()
        with BuildLine():
            Line((-77.901477372, -1.5875), (-77.476108029, -1.5875))
            Line((-77.476108029, -1.5875), (-77.107727372, -1.374815329))
            ThreePointArc((-77.107727372, -1.374815329), (-77.490602138, -1.533407249), (-77.901477372, -1.5875))
        make_face()
        with BuildLine():
            ThreePointArc((-78.695227372, -1.374815329), (-78.312352606, -1.533407249), (-77.901477372, -1.5875))
            ThreePointArc((-77.901477372, -1.5875), (-77.490602138, -1.533407249), (-77.107727372, -1.374815329))
            ThreePointArc((-77.107727372, -1.374815329), (-76.313977372, 0), (-77.107727372, 1.374815329))
            ThreePointArc((-77.107727372, 1.374815329), (-77.490602138, 1.533407249), (-77.901477372, 1.5875))
            ThreePointArc((-77.901477372, 1.5875), (-78.312352606, 1.533407249), (-78.695227372, 1.374815329))
            ThreePointArc((-78.695227372, 1.374815329), (-79.488977372, 0), (-78.695227372, -1.374815329))
        make_face()
        with BuildLine():
            Line((-77.107727372, 1.374815329), (-77.476108029, 1.5875))
            Line((-77.476108029, 1.5875), (-77.901477372, 1.5875))
            ThreePointArc((-77.901477372, 1.5875), (-77.490602138, 1.533407249), (-77.107727372, 1.374815329))
        make_face()
        with BuildLine():
            Line((-77.901477372, 1.5875), (-77.476108029, 1.5875))
            Line((-77.476108029, 1.5875), (-88.10625, 7.724815329))
            ThreePointArc((-88.10625, 7.724815329), (-90.274815329, 7.14375), (-89.69375, 4.975184671))
            Line((-89.69375, 4.975184671), (-81.076477372, 0))
            Line((-81.076477372, 0), (-78.695227372, 1.374815329))
            ThreePointArc((-78.695227372, 1.374815329), (-78.312352606, 1.533407249), (-77.901477372, 1.5875))
        make_face()
        with BuildLine():
            Line((-81.076477372, 0), (-78.695227372, -1.374815329))
            ThreePointArc((-78.695227372, -1.374815329), (-79.488977372, 0), (-78.695227372, 1.374815329))
            Line((-78.695227372, 1.374815329), (-81.076477372, 0))
        make_face()
    extrude(amount=-CUT_EXTRUDE2_DEPTH, mode=Mode.SUBTRACT)

    # Sketch8 → Boss-Extrude4 (add)
    with BuildSketch(Plane(origin=(0, 1.5, 0), x_dir=(1, 0, 0), z_dir=(0, 1, 0))):
        with Locations((-19.05, 0)):
            Rectangle(SKETCH8_W, SKETCH8_H)
    extrude(amount=BOSS_EXTRUDE4_DEPTH)

    # Sketch9 → Cut-Extrude8 (cut, up to next)
    with BuildSketch(Plane(origin=(0, 2.5, 0), x_dir=(1, 0, 0), z_dir=(0, 1, 0)), mode=Mode.PRIVATE) as cut_extrude8_sk1:
        with Locations((-88.9, 6.35)):
            Circle(SKETCH9_R)
    cut_extrude8_tool1 = extrude(cut_extrude8_sk1.sketch, amount=-CUT_EXTRUDE8_REACH, mode=Mode.PRIVATE) & part.part
    add(cut_extrude8_tool1.solids().sort_by_distance((-88.9, 2.5, -6.35))[0], mode=Mode.SUBTRACT)
    # Sketch9 → Cut-Extrude8 (cut, up to next)
    with BuildSketch(Plane(origin=(0, 2.5, 0), x_dir=(1, 0, 0), z_dir=(0, 1, 0)), mode=Mode.PRIVATE) as cut_extrude8_sk2:
        with Locations((-88.9, -6.35)):
            Circle(SKETCH9_R)
    cut_extrude8_tool2 = extrude(cut_extrude8_sk2.sketch, amount=-CUT_EXTRUDE8_REACH, mode=Mode.PRIVATE) & part.part
    add(cut_extrude8_tool2.solids().sort_by_distance((-88.9, 2.5, 6.35))[0], mode=Mode.SUBTRACT)
    # Sketch9 → Cut-Extrude8 (cut, up to next)
    with BuildSketch(Plane(origin=(0, 2.5, 0), x_dir=(1, 0, 0), z_dir=(0, 1, 0)), mode=Mode.PRIVATE) as cut_extrude8_sk3:
        with Locations((50.8, 0)):
            Circle(SKETCH9_R)
    cut_extrude8_tool3 = extrude(cut_extrude8_sk3.sketch, amount=-CUT_EXTRUDE8_REACH, mode=Mode.PRIVATE) & part.part
    add(cut_extrude8_tool3.solids().sort_by_distance((50.8, 2.5, 0))[0], mode=Mode.SUBTRACT)


solid = part.part
